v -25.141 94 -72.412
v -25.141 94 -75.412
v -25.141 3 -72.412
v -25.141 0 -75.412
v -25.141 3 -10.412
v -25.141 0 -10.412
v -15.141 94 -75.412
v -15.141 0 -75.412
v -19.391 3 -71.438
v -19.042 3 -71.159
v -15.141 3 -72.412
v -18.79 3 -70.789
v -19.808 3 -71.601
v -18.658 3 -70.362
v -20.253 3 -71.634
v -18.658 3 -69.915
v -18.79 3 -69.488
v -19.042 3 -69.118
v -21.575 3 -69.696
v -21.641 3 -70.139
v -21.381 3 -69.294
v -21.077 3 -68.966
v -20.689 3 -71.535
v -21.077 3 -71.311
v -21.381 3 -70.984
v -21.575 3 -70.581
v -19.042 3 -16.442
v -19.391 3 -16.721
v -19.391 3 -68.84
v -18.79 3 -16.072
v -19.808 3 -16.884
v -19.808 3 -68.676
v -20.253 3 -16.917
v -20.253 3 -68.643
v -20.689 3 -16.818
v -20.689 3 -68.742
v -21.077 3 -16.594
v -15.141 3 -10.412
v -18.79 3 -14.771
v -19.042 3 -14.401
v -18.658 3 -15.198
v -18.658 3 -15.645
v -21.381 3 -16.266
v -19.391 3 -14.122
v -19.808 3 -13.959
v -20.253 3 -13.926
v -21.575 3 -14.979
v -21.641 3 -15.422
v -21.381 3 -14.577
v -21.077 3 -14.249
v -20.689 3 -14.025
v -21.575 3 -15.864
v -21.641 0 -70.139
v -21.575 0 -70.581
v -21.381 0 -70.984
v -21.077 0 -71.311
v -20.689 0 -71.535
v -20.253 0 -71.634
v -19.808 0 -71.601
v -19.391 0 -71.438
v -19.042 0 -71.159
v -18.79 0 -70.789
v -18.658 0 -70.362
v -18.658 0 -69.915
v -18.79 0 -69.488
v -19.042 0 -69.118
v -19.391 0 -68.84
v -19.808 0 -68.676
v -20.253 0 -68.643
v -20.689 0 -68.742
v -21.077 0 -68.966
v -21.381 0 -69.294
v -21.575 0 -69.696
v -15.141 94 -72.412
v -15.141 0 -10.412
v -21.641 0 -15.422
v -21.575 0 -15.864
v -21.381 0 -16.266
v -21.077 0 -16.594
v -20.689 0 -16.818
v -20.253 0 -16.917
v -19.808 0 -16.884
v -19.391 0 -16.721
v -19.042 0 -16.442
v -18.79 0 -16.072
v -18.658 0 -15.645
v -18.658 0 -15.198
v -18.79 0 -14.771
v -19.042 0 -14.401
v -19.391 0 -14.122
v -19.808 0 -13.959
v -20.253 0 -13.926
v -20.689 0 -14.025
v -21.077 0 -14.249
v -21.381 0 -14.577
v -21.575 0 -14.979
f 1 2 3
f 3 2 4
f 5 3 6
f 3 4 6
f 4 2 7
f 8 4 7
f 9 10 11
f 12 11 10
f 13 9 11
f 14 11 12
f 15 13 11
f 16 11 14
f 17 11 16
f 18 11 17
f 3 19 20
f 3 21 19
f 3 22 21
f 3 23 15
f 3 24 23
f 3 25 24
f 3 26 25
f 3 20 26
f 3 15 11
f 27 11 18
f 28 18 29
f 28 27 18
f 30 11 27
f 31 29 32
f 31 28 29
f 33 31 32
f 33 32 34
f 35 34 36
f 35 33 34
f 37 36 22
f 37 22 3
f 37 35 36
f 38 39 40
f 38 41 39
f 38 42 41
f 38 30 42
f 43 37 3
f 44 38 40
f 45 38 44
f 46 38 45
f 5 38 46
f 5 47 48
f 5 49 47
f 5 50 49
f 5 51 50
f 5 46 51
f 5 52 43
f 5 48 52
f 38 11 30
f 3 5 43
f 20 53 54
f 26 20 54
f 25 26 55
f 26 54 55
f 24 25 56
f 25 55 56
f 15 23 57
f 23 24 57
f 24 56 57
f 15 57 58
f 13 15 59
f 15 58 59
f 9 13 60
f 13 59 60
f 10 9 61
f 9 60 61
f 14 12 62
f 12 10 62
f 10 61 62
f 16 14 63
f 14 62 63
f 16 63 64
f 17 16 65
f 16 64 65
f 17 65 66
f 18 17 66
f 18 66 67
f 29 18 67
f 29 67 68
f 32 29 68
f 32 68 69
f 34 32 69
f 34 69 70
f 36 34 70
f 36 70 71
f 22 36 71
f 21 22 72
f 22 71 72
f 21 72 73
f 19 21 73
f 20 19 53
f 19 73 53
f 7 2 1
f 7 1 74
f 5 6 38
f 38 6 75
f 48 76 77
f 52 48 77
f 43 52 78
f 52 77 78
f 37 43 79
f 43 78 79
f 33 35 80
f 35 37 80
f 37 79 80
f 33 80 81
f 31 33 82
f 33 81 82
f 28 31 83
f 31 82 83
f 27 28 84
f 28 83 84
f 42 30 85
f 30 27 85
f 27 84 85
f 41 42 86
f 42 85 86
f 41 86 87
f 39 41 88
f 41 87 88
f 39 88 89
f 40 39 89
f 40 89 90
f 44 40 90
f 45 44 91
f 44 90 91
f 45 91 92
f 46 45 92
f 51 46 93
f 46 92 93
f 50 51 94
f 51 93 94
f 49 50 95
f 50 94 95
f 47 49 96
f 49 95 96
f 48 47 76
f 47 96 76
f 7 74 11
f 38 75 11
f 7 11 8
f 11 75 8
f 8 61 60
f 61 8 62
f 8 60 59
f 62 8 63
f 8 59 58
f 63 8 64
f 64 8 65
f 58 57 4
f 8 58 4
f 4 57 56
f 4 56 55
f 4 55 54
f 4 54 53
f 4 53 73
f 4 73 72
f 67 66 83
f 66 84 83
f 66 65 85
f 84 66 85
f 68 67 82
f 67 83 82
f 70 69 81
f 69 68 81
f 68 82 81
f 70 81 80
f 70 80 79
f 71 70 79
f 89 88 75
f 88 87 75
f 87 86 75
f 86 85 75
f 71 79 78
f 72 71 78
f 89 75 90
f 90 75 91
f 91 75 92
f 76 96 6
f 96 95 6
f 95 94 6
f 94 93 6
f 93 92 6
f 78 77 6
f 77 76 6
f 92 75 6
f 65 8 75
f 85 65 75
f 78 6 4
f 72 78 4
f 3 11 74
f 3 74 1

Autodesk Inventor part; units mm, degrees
ref_plane "YZ Plane" through (0, 0, 0) normal (1, 0, 0) x (0, 1, 0)
ref_plane "XZ Plane" through (0, 0, 0) normal (0, 1, 0) x (-1, 0, 0)
ref_plane "XY Plane" through (0, 0, 0) normal (0, 0, 1) x (1, 0, 0)
sketch "Boceto1" plane through (0, 0, 0) normal (0, 1, 0) x (-1, 0, 0)
  circle A0 centre (20.1414, -70.1386) radius 1.5
  circle A1 centre (20.1414, -15.4215) radius 1.5
  line L0 (115.646, -75.4125) -> (-5.464, -75.4125)
  line L1 (20.1414, -75.4125) -> (15.1414, -75.4125)
  line L2 (15.1414, -75.4125) -> (25.1414, -75.4125)
  line L3 (25.1414, -75.4125) -> (25.1414, -10.4125)
  line L4 (25.1414, -10.4125) -> (15.1414, -10.4125)
  line L5 (15.1414, -10.4125) -> (15.1414, -75.4125)
  circle A2 centre (20.1414, -70.1386) radius 1.5
  circle A3 centre (20.1414, -15.4215) radius 1.5
  line L6 (115.646, -75.4125) -> (-5.464, -75.4125)
  line L7 (20.1414, -75.4125) -> (15.1414, -75.4125)
  line L8 (15.1414, -75.4125) -> (25.1414, -75.4125)
  line L9 (25.1414, -75.4125) -> (25.1414, -10.4125)
  line L10 (25.1414, -10.4125) -> (15.1414, -10.4125)
  line L11 (15.1414, -10.4125) -> (15.1414, -75.4125)
  point P0 (0, 0)
  dimension "d0" = 5
  dimension "d1" = 10
  dimension "d2" = 65
  dimension "d3" = 5
  dimension "d4" = 10
  dimension "d5" = 65
extrude "Extrusión1" add sketch "Boceto1" along normal blind 3
sketch "Boceto2" plane through (0, 3, 0) normal (0, 1, 0) x (1, 0, 0)
  line L0 (-15.1414, 75.4125) -> (-25.1414, 75.4125) projected
  line L1 (-15.1414, 10.4125) -> (-15.1414, 75.4125) projected
  line L2 (-25.1414, 75.4125) -> (-15.1414, 75.4125)
  line L3 (-15.1414, 75.4125) -> (-15.1414, 72.4125)
  line L4 (-15.1414, 72.4125) -> (-25.1414, 72.4125)
  line L5 (-25.1414, 72.4125) -> (-25.1414, 75.4125)
  point P0 (0, 0)
  dimension "d8" = 3
extrude "Extrusión2" add sketch "Boceto2" along normal blind 91
properties part number "piezasoportepantalla"
